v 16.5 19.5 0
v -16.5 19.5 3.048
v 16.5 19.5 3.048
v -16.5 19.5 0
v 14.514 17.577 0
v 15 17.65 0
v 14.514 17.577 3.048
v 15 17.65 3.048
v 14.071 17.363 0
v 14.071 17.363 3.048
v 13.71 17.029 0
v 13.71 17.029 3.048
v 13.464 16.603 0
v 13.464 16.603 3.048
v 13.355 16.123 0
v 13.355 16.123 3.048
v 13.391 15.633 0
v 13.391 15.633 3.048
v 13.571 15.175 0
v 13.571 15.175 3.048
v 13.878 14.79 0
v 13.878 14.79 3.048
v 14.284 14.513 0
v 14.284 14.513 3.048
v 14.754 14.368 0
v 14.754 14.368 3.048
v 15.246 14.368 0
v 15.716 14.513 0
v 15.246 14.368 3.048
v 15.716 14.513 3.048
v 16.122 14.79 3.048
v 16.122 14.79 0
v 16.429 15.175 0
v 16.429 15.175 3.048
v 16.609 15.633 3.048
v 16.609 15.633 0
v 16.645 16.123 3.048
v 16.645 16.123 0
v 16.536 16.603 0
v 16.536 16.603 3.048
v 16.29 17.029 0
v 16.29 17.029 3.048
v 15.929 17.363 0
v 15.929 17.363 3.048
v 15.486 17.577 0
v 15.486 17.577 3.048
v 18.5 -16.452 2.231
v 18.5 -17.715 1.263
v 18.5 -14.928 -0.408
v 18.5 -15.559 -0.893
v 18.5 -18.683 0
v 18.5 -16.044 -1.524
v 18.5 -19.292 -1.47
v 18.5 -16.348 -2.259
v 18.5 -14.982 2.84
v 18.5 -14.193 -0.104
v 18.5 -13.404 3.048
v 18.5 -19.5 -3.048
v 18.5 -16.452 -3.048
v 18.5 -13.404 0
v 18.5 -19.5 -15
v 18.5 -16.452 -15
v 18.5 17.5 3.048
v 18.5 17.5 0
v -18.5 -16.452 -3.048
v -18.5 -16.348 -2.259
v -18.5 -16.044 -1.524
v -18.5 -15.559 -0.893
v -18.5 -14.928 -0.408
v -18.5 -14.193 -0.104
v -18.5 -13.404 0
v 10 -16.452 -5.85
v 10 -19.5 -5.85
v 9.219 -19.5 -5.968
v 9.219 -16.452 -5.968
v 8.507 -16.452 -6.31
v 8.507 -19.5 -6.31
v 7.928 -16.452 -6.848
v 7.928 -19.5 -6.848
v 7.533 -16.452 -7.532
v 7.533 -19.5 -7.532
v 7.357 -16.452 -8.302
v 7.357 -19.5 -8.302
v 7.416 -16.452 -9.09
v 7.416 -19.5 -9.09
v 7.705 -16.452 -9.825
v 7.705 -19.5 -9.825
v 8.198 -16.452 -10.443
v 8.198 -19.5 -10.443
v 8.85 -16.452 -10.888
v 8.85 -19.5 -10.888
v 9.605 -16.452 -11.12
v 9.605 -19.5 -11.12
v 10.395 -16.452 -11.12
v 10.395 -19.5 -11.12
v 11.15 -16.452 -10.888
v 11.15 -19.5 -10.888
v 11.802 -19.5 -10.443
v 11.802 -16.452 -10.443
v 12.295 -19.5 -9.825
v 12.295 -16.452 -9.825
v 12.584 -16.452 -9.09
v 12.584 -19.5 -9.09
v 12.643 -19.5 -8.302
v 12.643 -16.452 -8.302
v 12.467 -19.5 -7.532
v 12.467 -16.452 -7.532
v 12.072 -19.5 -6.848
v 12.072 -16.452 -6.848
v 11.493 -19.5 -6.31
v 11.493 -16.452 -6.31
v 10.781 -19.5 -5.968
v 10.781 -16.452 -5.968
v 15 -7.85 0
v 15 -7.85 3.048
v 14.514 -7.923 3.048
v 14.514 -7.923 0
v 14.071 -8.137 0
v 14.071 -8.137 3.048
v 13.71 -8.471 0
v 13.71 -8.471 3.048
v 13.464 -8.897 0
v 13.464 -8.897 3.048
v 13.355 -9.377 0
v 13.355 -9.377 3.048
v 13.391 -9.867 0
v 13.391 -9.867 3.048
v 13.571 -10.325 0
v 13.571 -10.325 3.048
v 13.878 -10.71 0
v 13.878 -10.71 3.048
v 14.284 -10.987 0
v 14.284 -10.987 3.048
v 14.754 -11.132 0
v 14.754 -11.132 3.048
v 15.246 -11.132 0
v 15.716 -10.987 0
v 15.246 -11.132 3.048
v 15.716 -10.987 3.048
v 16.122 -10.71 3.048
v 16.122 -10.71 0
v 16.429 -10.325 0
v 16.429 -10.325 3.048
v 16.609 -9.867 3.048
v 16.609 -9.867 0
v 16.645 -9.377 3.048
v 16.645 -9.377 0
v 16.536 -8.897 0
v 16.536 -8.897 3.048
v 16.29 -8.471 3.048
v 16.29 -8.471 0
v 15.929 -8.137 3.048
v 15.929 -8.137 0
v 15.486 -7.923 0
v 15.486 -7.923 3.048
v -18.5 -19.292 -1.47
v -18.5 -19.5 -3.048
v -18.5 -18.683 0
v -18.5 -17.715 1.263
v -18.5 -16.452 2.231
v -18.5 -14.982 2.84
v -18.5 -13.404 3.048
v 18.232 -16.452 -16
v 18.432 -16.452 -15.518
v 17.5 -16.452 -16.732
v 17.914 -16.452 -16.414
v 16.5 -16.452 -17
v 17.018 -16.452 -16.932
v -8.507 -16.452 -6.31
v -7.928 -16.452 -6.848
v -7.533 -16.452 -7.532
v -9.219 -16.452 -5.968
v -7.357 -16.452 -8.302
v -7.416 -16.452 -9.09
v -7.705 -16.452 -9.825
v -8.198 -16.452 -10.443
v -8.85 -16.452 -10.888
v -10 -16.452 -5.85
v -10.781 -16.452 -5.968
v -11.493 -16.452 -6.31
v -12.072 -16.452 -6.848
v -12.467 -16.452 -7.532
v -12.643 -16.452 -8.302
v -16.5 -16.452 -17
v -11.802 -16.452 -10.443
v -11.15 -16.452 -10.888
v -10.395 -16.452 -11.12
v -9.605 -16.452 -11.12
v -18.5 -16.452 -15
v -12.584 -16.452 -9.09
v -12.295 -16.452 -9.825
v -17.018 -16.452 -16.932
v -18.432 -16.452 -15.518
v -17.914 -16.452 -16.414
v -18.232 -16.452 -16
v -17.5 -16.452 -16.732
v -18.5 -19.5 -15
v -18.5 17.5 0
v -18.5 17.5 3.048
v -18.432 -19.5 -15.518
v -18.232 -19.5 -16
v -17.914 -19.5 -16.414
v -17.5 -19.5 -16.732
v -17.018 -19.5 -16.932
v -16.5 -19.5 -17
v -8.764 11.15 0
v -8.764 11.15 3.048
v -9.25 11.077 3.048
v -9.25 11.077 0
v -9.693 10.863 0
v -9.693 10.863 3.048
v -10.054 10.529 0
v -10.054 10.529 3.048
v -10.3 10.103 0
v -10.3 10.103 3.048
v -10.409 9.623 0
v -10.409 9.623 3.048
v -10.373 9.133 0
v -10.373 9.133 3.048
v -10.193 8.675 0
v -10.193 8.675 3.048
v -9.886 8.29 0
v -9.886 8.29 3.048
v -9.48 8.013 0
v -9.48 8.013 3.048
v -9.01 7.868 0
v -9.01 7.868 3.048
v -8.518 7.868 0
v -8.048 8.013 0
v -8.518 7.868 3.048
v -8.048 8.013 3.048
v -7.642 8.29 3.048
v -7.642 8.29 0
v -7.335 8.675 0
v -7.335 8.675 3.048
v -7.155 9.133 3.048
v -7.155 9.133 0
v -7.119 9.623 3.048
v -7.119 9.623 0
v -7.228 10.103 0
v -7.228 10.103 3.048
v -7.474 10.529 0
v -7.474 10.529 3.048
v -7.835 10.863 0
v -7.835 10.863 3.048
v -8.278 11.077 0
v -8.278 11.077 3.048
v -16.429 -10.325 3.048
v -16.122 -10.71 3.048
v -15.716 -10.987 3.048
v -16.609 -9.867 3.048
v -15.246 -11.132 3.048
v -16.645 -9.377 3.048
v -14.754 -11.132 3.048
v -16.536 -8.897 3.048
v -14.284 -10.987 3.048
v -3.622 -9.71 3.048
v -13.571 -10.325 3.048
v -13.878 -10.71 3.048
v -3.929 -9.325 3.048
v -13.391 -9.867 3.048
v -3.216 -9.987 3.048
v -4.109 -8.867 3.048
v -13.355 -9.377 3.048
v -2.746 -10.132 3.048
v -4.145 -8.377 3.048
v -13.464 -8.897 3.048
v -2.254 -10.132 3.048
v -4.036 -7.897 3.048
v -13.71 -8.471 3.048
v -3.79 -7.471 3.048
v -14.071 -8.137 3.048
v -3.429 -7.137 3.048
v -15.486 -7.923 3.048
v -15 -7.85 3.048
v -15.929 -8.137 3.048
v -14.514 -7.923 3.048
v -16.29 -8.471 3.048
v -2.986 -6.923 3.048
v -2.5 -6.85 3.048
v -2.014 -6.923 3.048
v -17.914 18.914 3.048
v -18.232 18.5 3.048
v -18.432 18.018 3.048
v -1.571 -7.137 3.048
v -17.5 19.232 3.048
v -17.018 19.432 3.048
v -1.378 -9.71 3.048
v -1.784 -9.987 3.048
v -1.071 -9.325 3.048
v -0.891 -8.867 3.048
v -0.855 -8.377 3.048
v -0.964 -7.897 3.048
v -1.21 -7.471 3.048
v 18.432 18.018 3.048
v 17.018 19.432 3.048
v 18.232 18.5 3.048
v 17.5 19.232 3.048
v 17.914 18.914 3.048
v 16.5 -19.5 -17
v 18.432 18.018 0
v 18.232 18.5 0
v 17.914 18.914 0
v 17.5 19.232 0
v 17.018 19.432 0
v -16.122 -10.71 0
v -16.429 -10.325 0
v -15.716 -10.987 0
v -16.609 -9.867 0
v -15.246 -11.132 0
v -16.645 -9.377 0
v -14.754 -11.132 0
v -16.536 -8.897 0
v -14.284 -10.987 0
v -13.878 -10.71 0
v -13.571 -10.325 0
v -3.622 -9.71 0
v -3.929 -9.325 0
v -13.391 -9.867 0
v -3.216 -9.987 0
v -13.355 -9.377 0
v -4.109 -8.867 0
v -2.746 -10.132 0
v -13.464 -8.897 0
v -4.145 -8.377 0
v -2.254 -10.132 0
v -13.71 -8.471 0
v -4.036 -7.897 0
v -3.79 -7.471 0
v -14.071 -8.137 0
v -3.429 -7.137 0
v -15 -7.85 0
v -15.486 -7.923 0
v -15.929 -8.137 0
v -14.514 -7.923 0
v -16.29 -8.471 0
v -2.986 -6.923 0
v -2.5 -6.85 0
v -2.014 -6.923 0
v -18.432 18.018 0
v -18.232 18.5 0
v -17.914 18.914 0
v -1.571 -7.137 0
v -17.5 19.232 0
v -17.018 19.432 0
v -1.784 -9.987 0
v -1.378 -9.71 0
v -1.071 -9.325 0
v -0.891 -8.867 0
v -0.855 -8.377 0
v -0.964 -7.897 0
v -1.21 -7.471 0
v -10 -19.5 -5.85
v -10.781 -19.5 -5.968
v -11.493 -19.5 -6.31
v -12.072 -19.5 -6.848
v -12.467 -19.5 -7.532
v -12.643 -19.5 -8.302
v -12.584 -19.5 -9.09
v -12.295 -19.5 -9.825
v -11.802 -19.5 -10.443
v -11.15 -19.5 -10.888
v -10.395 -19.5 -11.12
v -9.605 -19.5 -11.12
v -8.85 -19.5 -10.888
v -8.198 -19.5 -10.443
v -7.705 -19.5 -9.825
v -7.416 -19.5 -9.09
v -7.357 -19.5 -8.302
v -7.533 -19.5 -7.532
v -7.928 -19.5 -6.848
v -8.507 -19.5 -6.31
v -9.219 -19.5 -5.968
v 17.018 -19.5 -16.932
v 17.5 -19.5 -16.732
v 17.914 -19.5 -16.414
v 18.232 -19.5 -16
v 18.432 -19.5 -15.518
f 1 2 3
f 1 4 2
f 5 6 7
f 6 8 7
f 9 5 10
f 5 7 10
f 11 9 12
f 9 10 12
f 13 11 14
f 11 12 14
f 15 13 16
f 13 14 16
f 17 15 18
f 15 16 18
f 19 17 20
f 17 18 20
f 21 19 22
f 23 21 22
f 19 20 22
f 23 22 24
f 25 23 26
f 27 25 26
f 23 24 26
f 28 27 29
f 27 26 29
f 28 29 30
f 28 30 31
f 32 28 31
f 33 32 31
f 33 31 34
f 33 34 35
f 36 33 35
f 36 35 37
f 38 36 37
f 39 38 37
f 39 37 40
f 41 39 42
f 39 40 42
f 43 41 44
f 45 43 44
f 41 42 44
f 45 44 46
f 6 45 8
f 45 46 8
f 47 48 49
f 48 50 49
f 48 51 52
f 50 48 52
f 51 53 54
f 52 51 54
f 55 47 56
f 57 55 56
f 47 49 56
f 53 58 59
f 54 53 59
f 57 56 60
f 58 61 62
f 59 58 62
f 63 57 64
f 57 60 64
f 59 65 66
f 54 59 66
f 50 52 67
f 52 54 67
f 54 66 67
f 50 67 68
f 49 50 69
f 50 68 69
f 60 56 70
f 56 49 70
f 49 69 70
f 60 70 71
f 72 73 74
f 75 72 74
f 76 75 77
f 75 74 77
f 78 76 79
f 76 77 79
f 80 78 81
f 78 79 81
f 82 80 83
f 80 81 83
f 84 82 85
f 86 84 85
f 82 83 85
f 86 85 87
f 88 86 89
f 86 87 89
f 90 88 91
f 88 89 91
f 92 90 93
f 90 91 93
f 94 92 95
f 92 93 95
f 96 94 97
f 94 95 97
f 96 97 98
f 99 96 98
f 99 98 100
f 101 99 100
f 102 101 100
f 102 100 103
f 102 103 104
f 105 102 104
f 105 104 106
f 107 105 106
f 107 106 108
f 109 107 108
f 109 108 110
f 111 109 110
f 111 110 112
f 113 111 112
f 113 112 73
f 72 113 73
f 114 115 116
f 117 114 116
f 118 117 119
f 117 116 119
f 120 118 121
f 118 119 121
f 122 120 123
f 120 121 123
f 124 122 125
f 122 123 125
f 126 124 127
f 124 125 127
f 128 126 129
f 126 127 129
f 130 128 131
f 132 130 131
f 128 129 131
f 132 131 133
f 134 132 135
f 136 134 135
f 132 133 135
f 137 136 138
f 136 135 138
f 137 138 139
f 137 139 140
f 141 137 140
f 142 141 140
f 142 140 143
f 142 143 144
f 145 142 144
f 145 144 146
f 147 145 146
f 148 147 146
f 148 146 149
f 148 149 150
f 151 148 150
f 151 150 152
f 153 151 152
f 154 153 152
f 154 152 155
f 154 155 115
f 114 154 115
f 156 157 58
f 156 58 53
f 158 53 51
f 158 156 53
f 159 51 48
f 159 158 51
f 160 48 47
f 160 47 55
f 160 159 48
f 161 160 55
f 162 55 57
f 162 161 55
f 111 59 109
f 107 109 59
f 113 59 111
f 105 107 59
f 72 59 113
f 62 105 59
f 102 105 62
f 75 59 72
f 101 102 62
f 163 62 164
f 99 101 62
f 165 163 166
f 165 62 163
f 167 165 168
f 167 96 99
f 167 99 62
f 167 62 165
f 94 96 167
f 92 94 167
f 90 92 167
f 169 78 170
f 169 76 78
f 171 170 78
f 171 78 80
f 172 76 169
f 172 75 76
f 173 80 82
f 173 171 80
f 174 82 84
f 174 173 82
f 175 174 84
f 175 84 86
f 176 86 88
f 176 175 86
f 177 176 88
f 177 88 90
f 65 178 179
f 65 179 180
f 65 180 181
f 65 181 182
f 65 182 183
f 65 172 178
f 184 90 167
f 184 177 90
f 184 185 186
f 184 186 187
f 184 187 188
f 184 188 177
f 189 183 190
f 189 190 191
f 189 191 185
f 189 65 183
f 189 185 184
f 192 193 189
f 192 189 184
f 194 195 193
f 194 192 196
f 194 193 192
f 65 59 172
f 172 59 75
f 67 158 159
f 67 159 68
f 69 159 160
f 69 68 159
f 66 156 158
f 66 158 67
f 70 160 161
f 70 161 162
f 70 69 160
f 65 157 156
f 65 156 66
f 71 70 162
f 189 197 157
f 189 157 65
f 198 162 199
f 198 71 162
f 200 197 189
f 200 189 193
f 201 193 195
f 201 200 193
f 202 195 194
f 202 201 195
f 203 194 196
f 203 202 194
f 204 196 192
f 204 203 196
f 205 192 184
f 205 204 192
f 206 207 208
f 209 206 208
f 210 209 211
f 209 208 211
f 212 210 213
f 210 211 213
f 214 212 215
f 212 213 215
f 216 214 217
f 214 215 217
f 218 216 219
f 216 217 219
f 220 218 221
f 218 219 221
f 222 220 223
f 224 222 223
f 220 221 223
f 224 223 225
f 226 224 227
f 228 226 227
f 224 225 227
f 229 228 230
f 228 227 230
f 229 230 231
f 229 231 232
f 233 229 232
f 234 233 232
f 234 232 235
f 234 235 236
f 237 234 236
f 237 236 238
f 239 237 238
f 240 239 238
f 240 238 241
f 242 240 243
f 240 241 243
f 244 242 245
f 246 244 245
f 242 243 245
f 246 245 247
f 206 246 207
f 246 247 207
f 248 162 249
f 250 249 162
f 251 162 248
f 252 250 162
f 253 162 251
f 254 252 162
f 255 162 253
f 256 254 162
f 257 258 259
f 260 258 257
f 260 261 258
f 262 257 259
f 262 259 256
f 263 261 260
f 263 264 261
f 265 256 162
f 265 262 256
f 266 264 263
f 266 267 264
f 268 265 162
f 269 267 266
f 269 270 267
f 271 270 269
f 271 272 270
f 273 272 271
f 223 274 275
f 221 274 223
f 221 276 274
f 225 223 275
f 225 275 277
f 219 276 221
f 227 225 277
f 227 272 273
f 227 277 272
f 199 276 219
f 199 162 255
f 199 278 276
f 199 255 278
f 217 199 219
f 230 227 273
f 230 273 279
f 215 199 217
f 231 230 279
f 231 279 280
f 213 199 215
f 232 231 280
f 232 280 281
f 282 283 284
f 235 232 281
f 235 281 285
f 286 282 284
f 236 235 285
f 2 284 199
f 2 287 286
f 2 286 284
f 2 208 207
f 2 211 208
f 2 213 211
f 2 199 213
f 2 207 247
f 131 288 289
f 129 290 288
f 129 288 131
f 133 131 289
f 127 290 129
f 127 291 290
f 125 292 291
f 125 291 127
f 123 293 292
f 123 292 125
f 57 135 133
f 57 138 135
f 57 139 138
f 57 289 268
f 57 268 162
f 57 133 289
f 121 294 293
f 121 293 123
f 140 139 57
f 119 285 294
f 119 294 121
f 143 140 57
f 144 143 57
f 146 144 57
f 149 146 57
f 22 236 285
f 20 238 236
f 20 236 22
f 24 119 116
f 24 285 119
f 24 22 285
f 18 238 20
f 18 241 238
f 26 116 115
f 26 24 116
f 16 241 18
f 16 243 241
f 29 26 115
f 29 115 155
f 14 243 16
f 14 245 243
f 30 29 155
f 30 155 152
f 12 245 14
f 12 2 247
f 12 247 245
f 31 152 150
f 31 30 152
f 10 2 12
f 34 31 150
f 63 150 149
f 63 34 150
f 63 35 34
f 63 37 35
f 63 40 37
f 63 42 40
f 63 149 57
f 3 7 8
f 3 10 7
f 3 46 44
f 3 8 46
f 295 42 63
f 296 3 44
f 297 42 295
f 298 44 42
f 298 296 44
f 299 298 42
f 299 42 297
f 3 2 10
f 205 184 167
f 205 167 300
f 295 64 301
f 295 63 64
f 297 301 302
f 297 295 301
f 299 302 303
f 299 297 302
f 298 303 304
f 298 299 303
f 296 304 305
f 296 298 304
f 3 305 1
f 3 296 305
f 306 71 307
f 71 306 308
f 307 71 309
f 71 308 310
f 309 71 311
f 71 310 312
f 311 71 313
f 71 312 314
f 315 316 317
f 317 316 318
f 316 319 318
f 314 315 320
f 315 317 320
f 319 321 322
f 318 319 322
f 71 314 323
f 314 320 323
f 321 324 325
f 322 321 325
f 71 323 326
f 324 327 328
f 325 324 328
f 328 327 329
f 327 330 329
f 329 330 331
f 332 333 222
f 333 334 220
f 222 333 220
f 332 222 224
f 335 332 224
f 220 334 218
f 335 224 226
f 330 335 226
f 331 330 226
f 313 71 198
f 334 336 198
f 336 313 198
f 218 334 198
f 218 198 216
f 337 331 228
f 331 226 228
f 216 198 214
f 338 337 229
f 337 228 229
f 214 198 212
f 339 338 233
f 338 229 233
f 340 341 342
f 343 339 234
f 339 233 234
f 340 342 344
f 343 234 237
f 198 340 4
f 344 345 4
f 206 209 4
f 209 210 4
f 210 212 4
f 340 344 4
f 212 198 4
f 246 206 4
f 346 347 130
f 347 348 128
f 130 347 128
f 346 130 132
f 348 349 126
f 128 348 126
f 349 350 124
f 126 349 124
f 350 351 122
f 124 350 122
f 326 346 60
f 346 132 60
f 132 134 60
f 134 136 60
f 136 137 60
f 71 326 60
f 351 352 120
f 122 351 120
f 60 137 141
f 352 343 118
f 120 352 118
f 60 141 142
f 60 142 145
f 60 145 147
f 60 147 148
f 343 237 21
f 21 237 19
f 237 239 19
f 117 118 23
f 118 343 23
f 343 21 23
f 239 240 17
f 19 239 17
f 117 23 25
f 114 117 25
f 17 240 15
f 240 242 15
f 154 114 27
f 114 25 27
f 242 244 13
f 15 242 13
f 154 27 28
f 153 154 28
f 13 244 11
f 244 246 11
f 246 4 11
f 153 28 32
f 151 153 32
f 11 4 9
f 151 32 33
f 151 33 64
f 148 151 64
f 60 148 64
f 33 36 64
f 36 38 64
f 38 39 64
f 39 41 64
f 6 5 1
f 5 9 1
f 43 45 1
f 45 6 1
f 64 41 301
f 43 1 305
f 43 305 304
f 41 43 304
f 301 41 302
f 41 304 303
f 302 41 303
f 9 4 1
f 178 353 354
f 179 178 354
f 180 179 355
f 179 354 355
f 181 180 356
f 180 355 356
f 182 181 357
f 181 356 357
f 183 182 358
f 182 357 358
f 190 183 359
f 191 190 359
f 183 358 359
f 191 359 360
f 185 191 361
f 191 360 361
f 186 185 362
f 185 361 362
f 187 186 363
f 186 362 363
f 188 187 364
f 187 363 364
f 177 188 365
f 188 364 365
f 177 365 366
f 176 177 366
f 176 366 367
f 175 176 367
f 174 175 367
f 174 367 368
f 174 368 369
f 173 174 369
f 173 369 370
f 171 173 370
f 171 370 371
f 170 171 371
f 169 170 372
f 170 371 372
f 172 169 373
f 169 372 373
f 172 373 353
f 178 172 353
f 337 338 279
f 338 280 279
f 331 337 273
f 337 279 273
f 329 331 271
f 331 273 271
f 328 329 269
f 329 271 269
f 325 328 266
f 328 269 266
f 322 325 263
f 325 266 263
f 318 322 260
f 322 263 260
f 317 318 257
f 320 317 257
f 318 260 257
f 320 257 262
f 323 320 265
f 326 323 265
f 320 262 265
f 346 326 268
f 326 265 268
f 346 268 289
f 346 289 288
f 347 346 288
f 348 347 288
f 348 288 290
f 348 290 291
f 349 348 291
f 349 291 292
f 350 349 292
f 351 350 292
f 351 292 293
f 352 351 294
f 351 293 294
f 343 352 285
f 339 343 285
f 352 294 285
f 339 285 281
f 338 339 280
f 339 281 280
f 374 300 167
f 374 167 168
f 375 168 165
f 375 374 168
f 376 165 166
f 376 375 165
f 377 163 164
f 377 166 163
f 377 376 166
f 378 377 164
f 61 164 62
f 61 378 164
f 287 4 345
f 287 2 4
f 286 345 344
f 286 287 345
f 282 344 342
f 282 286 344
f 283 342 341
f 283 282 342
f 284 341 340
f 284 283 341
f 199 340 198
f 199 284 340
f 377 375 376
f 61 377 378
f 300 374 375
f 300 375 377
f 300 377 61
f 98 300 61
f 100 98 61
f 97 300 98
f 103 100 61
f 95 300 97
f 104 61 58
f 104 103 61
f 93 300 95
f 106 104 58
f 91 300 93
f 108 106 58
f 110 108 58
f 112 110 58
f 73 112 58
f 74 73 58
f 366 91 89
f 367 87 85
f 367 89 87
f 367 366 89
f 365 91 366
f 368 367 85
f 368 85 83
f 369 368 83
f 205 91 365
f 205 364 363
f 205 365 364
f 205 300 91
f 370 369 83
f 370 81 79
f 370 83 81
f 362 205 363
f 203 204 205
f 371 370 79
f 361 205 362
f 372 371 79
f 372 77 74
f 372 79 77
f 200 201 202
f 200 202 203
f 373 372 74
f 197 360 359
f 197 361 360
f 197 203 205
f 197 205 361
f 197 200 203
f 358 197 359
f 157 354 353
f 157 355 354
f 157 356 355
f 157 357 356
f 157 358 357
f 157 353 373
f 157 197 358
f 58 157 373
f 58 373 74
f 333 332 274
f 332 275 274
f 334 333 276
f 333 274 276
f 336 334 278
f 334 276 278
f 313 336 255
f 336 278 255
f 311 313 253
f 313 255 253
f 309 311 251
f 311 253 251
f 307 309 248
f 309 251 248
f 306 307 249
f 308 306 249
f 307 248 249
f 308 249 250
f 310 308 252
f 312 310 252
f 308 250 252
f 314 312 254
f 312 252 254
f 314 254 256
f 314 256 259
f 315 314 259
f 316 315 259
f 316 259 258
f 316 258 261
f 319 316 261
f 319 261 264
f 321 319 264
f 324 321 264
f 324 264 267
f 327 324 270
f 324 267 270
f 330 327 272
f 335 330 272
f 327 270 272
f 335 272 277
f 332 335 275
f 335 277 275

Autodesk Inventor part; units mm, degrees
ref_plane "YZ Plane" through (0, 0, 0) normal (1, 0, 0) x (0, 1, 0)
ref_plane "XZ Plane" through (0, 0, 0) normal (0, 1, 0) x (-1, 0, 0)
ref_plane "XY Plane" through (0, 0, 0) normal (0, 0, 1) x (1, 0, 0)
sketch "Sketch1" plane through (0, 0, 0) normal (0, 0, 1) x (1, 0, 0)
  line L0 (18.5, -19.5) -> (-18.5, -19.5)
  line L1 (-18.5, -19.5) -> (-18.5, 19.5)
  line L2 (-18.5, 19.5) -> (18.5, 19.5)
  line L3 (18.5, 19.5) -> (18.5, -19.5)
  line L4 (18.5, -19.5) -> (-18.5, 19.5) construction
  line L5 (-18.5, -19.5) -> (18.5, 19.5) construction
  circle A0 centre (-2.5, -8.5) radius 9 construction
  circle A1 centre (-8.764, 9.5) radius 9 construction
  circle A2 centre (-15, -9.5) radius 2.5 construction
  circle A3 centre (15, 16) radius 2.5 construction
  circle A4 centre (15, -9.5) radius 2.5 construction
  line L6 (-15, -9.5) -> (15, -9.5) construction
  point P0 (0, 0)
  point P1 (0, -9.5)
  dimension "d0" = 37
  dimension "d1" = 39
  dimension "d2" = 11
  dimension "d3" = 2.5
  dimension "d4" = 18
  dimension "d5" = 18
  dimension "d6" = 18
  dimension "d7" = 6.264
  dimension "d8" = 5
  dimension "d10" = 30
  dimension "d11" = 10
  dimension "d12" = 3.5
  dimension "d13" = 3.5
extrude "Plate1" add sketch "Sketch1" along normal blind 3.048
sketch "Sketch2" plane through (-18.5, -16.452, 3.048) normal (0, -1, 0) x (1, 0, 0)
  line L0 (37, 0) -> (0, 0)
  line L1 (0, 0) -> (0, -20.048)
  line L2 (0, -20.048) -> (37, -20.048)
  line L3 (37, -20.048) -> (37, 0)
edge flange "Flange1" height 17 angle 90 thickness 3.048 bend radius 3.048 thickness toward (0, -1, 0) relief tear relief width 3.048 relief depth 1.524 edges at (0, -19.5, 0) wall of the first edge with corners at (18.5, -16.452, 3.048) (-18.5, -16.452, 3.048) (-18.5, -16.452, -17) (18.5, -16.452, -17)
bend "Bend1"
corner "Corner1"
hole "Hole1" at (-2.5, -8.5, 0) at (-8.764, 9.5, 0) direction (0, 0, 1) diameter 3.3 end through all
hole "Hole2" at (15, 16, 0) at (15, -9.5, 0) at (-15, -9.5, 0) direction (0, 0, 1) diameter 3.3 end through all
sketch "Sketch3" plane through (-18.5, -16.452, -17) normal (0, 1, 0) x (1, 0, 0)
  line L0 (0, -13.952) -> (37, -13.952) construction
  line L1 (37, -13.952) -> (37, 0) construction
  line L2 (37, 0) -> (0, 0) construction
  line L3 (0, -13.952) -> (0, 0) construction
  line L4 (8.5, -8.5) -> (28.5, -8.5) construction
  line L5 (8.5, -8.5) -> (0, -8.5) construction
  line L6 (0, -8.5) -> (0, 0) construction
  line L7 (0, 0) -> (8.5, 0) construction
  line L8 (8.5, 0) -> (8.5, -8.5) construction
  point P0 (18.5, -17)
  point P1 (18.5, 0)
  point P2 (18.5, -8.5)
  dimension "d39" = 20
hole "Hole3" at (-10, -16.452, -8.5) at (10, -16.452, -8.5) direction (0, -1, 0) diameter 5.3 end through all
fillet "Fillet1" radius 2 4 edges at (18.5, -17.976, -17) (-18.5, 19.5, 1.524) (18.5, 19.5, 1.524) (-18.5, -17.976, -17)
ref_plane "Work Plane1" through (0, -16.452, -17) normal (-1, 0, 0) x (0, -1, 0)
equation "\"d13\" = d12"
equation "\"d30\" = Thickness"
equation "\"d14\" = Thickness"
equation "\"d15\" = BendReliefWidth"
equation "\"d16\" = BendReliefDepth"
equation "\"d17\" = MinimumRemnant"
equation "\"d18\" = TransitionRadius"
equation "\"d21\" = BendRadius"
equation "\"d22\" = CornerReliefSize"
equation "\"d23\" = GapSize"
equation "\"d24\" = JacobiRadiusSize"
equation "\"BendRadius\" = Thickness"
equation "\"BendReliefWidth\" = Thickness"
equation "\"BendReliefDepth\" = 0.5 * Thickness"
equation "\"CornerReliefSize\" = 4 * Thickness"
equation "\"MinimumRemnant\" = 2 * Thickness"
equation "\"TransitionRadius\" = BendRadius"
equation "\"JacobiRadiusSize\" = BendRadius"
equation "\"GapSize\" = Thickness"
equation "\"Thickness\" = 3.048"
properties part number "XY Idler Mount"
